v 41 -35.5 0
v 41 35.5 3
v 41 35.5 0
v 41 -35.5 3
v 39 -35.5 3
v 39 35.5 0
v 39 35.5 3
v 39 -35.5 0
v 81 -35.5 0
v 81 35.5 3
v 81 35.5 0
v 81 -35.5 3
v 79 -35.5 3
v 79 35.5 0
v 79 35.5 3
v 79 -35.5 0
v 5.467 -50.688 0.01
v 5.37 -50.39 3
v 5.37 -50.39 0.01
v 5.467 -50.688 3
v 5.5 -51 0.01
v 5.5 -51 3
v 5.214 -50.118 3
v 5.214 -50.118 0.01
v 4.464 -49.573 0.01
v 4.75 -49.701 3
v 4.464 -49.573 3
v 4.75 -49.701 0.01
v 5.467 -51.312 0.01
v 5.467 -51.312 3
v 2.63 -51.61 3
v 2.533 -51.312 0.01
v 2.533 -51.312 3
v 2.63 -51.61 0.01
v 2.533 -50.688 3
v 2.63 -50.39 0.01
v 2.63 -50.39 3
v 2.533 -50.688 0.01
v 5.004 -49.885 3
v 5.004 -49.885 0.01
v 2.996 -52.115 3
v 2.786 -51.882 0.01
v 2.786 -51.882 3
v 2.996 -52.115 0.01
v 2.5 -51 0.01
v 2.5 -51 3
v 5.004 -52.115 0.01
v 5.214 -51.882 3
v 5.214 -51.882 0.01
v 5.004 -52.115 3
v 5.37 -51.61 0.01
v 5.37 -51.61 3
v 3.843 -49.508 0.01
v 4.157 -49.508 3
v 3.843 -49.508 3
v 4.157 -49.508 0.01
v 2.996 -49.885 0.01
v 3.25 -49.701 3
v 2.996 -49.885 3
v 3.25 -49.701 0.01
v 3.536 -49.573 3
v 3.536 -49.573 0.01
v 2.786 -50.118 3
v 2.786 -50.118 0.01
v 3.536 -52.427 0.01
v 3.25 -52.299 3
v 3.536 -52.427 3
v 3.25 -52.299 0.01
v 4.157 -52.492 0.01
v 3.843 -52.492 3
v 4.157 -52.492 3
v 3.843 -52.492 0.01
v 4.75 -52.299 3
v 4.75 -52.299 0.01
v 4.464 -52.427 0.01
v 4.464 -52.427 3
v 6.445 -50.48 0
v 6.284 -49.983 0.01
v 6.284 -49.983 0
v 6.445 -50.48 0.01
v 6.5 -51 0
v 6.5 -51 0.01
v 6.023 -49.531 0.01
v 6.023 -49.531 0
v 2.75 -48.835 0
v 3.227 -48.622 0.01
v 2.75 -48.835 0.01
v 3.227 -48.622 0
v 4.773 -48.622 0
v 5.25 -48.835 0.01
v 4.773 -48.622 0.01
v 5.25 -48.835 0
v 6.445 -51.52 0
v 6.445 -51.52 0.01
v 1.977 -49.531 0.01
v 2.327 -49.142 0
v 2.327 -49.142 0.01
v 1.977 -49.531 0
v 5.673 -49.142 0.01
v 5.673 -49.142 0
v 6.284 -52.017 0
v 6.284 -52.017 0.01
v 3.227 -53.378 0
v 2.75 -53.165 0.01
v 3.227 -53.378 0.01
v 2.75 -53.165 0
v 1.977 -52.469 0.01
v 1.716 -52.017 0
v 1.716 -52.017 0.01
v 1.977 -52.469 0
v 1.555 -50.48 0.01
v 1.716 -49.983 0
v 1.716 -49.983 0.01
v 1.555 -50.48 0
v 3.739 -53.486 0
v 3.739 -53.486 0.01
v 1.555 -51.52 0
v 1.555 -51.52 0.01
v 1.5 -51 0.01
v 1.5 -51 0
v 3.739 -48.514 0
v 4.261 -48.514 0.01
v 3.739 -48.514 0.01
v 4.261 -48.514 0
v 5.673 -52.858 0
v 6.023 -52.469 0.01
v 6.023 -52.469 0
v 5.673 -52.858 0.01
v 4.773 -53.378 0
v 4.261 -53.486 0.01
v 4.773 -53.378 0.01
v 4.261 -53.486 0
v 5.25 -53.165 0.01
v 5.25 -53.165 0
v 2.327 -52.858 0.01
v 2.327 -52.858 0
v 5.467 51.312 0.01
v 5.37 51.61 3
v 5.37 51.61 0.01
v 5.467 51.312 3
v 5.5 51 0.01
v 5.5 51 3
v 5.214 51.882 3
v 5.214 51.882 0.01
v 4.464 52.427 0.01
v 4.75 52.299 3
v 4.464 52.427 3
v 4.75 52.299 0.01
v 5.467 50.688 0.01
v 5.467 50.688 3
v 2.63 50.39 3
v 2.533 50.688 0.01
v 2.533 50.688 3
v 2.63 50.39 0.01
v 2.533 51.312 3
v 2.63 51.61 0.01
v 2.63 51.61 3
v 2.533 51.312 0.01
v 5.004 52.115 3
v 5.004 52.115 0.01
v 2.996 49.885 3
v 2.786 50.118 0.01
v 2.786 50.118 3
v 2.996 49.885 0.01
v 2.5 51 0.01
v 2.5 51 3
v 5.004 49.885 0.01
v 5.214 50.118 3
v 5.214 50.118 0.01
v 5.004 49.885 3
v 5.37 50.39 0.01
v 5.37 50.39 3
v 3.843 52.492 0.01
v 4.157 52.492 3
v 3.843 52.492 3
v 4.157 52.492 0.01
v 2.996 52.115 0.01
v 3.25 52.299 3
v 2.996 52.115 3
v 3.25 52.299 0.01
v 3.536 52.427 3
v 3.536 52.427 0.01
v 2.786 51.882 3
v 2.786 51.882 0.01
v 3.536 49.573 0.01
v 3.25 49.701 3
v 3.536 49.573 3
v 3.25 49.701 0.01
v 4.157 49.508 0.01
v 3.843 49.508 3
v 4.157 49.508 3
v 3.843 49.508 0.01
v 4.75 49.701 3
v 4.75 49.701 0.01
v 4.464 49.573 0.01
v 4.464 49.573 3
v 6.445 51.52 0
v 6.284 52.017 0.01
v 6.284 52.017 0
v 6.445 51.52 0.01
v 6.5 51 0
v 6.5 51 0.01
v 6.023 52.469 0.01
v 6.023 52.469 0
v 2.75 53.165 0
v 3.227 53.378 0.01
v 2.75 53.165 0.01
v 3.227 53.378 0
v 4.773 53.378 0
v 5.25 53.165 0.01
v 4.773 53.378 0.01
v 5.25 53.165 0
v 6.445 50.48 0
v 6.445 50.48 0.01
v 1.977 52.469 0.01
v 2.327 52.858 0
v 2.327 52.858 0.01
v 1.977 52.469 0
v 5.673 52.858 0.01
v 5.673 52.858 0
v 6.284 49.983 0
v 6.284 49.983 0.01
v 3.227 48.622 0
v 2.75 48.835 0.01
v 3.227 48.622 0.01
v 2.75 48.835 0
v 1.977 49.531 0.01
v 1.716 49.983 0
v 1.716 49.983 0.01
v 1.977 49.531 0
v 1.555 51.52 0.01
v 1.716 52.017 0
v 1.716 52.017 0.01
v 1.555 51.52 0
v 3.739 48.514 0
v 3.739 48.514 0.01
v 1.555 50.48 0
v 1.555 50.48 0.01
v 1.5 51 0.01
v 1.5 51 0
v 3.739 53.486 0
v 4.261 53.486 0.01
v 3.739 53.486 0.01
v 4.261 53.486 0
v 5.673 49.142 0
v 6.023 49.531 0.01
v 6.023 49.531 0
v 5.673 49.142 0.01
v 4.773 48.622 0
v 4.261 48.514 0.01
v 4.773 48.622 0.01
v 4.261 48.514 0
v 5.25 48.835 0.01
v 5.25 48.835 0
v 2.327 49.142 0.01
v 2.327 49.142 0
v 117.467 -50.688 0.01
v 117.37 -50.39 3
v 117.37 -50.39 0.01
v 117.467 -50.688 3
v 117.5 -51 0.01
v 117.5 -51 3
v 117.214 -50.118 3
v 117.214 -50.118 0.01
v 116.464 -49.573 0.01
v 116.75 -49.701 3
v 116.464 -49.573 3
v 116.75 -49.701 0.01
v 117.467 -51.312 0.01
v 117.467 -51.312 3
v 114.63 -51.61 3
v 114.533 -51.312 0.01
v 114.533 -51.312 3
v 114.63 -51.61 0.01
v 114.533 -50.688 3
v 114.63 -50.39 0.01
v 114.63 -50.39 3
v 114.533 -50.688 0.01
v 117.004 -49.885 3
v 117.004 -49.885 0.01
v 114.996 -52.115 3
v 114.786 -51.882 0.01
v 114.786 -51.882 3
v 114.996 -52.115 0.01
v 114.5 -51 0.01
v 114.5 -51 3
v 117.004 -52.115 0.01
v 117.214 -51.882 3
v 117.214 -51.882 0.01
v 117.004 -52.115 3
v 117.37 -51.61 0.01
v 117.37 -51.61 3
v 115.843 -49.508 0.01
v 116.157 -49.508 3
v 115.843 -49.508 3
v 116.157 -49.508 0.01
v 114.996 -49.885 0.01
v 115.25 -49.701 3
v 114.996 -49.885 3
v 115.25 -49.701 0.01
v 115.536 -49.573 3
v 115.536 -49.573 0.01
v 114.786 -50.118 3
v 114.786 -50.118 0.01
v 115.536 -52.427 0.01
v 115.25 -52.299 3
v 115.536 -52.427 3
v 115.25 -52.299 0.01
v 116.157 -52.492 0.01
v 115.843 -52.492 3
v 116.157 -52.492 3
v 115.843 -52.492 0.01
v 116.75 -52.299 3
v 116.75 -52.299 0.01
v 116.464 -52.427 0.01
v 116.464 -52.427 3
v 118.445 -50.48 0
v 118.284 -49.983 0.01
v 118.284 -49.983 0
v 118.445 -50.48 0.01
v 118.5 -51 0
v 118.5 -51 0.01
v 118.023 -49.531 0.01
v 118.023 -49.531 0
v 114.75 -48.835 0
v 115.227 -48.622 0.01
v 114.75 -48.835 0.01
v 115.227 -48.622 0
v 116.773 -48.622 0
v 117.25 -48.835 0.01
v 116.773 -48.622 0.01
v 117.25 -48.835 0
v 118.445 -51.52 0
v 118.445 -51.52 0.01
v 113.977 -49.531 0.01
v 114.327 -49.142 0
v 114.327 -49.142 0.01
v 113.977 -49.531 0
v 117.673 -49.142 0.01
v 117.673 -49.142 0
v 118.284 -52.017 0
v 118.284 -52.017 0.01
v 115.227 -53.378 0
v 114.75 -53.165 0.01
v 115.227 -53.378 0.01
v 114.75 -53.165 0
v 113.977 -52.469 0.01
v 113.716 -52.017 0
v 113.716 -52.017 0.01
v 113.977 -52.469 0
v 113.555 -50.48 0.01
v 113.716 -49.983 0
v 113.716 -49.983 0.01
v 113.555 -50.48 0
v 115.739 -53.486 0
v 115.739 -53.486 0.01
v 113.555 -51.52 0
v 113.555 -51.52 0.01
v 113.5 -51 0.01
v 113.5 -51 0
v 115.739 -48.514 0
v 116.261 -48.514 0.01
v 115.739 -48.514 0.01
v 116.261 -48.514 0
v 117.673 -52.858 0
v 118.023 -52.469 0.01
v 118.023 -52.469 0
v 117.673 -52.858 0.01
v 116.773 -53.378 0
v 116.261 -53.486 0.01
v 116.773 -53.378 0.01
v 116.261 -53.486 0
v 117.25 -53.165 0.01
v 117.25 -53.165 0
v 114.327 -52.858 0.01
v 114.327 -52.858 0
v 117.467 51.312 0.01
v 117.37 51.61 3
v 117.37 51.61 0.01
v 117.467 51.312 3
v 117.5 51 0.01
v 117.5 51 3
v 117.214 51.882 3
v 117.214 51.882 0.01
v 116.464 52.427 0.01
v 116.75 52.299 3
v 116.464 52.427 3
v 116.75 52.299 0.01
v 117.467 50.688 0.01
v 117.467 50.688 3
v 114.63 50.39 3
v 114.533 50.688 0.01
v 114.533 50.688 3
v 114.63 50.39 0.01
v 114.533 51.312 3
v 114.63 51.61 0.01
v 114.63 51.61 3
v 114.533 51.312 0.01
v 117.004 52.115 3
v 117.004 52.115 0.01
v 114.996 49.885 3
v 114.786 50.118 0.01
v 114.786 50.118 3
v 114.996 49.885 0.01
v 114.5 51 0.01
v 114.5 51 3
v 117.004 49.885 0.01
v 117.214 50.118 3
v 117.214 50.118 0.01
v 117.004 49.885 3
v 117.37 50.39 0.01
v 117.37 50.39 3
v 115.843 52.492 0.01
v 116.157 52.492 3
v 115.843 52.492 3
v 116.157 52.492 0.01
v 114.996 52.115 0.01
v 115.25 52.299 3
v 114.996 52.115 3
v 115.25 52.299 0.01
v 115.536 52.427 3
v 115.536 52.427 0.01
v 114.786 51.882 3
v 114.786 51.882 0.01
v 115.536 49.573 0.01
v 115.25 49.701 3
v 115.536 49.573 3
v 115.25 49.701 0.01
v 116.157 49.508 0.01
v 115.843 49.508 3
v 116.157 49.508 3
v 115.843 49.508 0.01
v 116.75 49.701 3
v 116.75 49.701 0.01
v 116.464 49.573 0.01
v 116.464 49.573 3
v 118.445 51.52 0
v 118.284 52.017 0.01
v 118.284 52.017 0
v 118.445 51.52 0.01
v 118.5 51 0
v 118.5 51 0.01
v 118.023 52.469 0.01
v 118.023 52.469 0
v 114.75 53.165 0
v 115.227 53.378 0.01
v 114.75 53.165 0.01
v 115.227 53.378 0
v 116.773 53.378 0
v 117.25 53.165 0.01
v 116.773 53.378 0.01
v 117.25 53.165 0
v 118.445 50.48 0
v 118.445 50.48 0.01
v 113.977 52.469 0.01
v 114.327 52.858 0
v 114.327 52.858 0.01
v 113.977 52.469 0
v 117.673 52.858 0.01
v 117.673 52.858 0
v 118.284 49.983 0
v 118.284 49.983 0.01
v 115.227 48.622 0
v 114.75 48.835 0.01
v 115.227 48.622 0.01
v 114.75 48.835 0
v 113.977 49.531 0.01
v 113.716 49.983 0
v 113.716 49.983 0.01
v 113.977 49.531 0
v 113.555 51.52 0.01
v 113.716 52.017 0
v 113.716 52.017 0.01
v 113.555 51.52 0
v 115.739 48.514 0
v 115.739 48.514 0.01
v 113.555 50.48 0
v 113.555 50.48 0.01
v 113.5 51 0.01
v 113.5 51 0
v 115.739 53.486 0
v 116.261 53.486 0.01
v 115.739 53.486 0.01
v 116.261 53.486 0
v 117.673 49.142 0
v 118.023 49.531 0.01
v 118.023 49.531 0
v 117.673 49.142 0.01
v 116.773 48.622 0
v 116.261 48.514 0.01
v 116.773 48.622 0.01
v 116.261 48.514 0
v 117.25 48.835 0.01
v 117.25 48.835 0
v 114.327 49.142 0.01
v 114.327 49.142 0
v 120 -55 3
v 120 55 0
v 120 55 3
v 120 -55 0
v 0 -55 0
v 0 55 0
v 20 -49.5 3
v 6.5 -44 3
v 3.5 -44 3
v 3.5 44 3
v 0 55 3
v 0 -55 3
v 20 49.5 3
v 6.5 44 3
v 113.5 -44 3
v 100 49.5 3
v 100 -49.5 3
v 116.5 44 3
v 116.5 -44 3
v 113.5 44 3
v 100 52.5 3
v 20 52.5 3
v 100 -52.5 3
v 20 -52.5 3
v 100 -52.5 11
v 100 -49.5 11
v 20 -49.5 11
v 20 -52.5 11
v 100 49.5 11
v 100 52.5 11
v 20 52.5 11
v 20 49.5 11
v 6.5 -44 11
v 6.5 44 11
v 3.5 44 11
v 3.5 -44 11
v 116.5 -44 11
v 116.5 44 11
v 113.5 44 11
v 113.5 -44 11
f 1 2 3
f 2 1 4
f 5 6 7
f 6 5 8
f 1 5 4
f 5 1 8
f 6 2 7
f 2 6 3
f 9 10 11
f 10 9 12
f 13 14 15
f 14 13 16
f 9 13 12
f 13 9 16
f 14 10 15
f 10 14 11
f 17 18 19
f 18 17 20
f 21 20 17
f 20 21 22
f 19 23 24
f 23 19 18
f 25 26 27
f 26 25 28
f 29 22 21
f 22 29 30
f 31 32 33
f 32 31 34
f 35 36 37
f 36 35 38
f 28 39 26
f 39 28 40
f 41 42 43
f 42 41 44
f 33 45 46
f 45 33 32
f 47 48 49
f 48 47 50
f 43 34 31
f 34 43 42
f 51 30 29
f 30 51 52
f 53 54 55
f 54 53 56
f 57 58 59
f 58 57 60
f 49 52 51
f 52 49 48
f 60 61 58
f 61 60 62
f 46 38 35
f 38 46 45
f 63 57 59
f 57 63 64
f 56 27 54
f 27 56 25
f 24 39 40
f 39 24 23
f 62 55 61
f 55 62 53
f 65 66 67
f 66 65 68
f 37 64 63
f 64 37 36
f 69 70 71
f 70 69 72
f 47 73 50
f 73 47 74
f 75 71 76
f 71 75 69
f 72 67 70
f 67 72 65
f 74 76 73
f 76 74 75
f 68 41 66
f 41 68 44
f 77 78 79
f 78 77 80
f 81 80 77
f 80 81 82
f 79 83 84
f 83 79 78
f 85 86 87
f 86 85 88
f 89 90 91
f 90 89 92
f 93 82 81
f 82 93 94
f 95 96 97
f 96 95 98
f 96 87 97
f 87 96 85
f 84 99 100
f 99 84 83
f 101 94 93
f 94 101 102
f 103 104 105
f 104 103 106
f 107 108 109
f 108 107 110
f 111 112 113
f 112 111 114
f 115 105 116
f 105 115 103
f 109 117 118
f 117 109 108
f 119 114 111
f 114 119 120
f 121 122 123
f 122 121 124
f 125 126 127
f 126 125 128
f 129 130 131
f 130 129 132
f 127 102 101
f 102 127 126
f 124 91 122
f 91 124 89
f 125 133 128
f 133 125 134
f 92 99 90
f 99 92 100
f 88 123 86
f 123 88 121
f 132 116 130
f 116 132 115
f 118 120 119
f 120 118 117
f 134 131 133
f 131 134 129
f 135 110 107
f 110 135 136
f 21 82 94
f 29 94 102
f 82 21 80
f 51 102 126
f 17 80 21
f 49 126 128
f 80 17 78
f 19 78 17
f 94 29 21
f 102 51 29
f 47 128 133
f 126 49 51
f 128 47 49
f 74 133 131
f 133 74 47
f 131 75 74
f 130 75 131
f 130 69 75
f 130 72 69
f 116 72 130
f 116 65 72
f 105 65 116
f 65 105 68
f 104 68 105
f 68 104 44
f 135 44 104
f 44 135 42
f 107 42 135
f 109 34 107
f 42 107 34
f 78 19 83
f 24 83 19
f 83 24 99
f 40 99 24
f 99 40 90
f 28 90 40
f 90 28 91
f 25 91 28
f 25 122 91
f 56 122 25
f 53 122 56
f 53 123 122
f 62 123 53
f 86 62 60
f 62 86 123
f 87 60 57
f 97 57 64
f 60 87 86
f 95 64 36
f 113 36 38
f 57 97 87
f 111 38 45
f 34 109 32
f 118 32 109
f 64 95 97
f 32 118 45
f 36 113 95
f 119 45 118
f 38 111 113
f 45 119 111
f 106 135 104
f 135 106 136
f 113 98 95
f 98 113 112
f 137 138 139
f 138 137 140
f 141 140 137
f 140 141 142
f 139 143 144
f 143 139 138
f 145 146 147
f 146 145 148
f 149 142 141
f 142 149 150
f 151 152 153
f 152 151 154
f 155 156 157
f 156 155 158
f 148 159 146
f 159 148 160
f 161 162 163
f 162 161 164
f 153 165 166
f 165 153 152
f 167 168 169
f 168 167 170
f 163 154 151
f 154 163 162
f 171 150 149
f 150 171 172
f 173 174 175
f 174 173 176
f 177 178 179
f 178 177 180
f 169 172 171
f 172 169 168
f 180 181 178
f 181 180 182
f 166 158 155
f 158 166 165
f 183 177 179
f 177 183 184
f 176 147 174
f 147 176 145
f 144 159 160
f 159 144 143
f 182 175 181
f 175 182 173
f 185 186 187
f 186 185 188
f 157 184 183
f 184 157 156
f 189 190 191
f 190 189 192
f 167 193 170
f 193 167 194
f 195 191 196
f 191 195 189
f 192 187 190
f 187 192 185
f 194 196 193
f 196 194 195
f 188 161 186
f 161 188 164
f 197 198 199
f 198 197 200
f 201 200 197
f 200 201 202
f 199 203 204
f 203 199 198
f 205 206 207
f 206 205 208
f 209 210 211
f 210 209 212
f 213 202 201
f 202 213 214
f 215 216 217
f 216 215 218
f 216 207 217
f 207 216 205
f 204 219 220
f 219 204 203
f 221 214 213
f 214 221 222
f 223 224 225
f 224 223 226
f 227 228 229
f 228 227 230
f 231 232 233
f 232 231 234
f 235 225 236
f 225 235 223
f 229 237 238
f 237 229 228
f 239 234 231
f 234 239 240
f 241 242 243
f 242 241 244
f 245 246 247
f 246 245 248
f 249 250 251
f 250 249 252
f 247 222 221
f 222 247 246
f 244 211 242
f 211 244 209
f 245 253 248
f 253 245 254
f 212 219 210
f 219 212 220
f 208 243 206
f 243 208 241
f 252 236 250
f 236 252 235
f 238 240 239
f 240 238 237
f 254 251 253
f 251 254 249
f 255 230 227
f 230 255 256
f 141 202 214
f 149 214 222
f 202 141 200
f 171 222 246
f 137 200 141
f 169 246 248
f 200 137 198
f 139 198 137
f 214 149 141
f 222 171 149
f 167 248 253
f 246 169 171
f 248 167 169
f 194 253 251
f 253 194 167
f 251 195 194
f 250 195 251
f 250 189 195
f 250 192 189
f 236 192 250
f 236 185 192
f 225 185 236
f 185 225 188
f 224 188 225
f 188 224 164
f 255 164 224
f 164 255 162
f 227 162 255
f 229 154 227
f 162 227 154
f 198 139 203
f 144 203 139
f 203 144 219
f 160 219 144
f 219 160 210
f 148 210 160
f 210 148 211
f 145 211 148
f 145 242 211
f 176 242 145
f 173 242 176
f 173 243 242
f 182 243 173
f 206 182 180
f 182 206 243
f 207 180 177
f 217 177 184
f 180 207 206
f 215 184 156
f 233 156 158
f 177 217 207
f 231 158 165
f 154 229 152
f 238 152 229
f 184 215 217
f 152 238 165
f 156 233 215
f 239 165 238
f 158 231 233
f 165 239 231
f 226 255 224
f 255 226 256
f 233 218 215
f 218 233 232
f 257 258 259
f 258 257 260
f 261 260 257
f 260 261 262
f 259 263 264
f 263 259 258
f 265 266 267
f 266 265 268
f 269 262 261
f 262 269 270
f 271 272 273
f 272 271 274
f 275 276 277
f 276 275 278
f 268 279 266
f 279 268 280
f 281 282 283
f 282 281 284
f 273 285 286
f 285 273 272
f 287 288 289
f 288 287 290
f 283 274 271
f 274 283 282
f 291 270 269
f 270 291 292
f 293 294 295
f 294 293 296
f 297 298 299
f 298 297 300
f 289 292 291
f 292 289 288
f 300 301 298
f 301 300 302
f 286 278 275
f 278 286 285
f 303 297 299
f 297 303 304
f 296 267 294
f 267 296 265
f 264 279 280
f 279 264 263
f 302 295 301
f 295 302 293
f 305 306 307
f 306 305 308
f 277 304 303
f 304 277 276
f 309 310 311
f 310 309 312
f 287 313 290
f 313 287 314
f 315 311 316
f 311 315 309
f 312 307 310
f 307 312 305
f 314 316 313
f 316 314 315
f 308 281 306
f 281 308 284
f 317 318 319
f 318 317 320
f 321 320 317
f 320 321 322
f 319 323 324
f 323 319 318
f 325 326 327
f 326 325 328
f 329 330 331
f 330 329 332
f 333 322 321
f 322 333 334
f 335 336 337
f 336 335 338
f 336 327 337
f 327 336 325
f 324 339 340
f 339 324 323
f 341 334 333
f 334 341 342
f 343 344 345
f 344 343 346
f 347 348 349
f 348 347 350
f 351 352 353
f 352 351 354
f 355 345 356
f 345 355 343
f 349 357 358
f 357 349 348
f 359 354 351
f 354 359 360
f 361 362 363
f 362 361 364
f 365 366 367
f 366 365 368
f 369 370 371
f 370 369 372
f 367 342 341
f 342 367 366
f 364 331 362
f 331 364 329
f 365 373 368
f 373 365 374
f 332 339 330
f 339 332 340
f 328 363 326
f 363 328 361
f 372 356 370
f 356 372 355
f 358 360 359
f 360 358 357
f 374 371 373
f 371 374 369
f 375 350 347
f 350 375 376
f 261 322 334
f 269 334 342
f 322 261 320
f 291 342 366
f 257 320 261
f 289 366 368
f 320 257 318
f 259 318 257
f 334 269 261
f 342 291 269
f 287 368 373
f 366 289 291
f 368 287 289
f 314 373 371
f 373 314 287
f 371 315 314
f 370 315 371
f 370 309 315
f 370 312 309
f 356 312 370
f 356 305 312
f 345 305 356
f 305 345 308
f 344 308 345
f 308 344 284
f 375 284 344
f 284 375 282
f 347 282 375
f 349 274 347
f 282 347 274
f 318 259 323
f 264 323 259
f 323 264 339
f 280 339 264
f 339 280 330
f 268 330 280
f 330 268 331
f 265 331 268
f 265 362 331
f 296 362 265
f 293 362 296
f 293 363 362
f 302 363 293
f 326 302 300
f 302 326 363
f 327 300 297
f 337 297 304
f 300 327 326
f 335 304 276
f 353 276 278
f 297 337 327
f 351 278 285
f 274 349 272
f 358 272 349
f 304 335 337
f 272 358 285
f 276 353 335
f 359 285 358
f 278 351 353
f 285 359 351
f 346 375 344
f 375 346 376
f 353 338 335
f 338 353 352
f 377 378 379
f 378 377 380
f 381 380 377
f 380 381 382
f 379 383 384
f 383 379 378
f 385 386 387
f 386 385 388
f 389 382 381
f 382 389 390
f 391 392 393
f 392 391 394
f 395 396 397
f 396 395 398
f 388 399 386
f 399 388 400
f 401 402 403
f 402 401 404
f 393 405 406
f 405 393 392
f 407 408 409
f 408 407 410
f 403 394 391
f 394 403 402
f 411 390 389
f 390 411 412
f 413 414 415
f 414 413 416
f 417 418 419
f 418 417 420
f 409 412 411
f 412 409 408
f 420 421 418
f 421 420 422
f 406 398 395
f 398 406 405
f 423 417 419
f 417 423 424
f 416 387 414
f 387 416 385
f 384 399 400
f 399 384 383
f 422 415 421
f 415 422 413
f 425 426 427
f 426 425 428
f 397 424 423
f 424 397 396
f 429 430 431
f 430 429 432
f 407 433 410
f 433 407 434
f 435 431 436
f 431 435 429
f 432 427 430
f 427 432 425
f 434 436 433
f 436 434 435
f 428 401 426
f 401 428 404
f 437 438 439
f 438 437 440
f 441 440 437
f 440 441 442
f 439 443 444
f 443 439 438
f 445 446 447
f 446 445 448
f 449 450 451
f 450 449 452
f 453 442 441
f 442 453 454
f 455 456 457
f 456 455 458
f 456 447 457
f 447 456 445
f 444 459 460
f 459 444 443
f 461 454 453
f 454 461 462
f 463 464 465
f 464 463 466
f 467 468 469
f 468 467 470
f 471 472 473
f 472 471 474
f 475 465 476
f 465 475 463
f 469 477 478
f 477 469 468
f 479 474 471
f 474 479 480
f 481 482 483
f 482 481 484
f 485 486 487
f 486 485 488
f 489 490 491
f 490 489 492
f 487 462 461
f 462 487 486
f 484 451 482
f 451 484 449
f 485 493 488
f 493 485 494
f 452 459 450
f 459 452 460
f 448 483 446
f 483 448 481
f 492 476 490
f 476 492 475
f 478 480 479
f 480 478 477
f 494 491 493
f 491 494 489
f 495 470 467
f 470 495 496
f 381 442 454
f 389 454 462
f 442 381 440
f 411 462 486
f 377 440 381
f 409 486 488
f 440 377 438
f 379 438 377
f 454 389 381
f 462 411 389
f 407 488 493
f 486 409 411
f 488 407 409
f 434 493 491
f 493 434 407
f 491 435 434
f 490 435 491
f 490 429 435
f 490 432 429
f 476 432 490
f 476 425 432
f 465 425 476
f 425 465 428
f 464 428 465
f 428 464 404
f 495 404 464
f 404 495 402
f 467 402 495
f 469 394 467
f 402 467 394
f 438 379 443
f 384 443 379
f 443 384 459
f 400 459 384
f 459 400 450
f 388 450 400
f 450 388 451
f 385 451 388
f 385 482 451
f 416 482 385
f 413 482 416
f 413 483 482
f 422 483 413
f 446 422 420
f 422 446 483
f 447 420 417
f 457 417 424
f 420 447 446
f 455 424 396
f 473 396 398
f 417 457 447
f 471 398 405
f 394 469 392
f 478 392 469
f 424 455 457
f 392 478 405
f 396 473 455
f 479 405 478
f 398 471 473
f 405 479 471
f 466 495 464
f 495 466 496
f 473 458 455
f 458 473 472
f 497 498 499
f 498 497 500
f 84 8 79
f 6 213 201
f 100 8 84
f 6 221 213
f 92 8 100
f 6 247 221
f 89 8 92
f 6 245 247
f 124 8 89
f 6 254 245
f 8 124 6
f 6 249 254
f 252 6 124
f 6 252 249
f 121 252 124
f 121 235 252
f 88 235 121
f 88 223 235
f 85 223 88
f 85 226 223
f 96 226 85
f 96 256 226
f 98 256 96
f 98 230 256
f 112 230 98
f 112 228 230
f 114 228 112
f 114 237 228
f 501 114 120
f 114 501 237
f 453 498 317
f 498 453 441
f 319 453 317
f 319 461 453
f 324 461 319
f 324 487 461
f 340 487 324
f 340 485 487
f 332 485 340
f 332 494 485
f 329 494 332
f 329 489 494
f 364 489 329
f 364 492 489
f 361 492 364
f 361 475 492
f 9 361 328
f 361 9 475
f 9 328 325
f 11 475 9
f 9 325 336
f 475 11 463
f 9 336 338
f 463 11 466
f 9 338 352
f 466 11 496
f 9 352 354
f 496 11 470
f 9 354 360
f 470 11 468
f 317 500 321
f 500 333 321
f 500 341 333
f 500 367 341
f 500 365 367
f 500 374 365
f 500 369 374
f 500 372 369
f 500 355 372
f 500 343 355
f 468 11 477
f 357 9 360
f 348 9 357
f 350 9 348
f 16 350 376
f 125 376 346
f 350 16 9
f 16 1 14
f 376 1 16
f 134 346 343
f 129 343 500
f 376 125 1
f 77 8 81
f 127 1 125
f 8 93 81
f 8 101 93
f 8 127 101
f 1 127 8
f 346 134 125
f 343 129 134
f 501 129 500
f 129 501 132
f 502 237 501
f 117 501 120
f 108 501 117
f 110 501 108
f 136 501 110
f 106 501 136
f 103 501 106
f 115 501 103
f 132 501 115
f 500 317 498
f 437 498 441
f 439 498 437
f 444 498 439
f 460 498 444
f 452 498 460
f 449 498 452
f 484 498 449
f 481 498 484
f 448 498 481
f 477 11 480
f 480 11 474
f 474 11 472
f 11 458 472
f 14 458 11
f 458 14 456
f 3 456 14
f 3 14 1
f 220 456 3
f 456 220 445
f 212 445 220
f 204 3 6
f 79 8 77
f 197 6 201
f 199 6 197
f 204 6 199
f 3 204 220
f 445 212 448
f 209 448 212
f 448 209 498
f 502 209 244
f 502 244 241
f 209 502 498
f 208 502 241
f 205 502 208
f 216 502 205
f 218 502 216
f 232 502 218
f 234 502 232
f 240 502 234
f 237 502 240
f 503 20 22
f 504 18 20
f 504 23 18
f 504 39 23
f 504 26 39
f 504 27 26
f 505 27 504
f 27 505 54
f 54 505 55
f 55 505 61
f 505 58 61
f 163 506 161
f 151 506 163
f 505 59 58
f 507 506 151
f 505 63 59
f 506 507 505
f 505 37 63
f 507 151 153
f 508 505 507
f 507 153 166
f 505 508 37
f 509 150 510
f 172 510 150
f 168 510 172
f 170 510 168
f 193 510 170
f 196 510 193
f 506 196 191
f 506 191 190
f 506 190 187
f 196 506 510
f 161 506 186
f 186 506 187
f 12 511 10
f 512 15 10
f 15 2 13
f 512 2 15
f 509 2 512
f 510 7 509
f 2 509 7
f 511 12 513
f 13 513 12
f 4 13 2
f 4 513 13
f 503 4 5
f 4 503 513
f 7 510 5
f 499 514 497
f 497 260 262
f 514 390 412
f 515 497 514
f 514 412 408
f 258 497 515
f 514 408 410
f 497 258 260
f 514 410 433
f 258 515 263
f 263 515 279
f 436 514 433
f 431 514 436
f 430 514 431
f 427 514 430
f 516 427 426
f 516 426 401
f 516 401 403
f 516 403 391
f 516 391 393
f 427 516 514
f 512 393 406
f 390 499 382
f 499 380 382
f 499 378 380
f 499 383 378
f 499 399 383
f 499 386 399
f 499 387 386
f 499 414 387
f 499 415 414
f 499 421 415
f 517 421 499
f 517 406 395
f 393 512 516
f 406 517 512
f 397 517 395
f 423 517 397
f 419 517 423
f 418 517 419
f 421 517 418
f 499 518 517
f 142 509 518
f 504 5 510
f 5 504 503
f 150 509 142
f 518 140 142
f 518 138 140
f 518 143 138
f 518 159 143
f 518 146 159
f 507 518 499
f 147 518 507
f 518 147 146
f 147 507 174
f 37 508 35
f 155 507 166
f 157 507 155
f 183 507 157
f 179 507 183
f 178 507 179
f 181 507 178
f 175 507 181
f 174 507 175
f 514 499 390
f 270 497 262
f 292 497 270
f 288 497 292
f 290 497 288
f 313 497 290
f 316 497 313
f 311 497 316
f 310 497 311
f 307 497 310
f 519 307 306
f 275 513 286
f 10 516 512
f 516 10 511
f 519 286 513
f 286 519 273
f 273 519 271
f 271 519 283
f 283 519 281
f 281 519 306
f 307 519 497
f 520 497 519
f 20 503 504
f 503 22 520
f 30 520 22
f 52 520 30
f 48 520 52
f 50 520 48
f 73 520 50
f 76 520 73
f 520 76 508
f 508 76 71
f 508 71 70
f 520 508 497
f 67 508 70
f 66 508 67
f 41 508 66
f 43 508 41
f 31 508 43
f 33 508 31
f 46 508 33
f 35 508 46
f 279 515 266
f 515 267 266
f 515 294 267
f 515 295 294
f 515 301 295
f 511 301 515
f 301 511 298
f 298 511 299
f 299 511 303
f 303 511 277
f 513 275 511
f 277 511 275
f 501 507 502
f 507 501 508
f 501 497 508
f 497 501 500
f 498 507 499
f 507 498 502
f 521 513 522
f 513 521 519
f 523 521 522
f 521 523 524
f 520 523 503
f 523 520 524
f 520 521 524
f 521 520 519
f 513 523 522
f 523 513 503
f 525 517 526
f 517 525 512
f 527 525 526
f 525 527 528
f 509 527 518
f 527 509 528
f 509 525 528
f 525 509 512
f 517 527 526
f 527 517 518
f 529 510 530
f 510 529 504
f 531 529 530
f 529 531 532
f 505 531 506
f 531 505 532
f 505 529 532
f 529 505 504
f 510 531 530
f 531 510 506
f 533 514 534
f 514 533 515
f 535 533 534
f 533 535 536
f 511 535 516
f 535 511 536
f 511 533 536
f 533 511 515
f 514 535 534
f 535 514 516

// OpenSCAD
// file: fader-insert-60mm-array.scad
/*
  3d printable insert for a control panel
  An array of 60mm faders may be mounted to the insert.
  The insert can then be mounted into to the face of the control
  panel.

  The idea is, it's easy to cut a large hole in a piece of 1/4 inch
  plywood into which the insert may be fitted, but is is difficult
  (impossible) to cut the tiny holes needed for each individual fader
  in such plywood, and anyway the plywood is too thick.

Define the following variables, then include this file and call

	fader_60mm_array_insert(0, 0, fader_spacing, fader_count);

plate_thickness = 3;
countersink = 0.01;
fader_spacing = 18;
fader_count = 10;
web_thickness = 3;
web_height = 10;
tang_hole_width = 2;
plate_height = 110;
fader_screw_holes = 1;

*/

$fn=30;

module fader_screw_hole(x, y, screw_radius, head_radius, hole_depth, countersink_depth)
{
	offset = countersink_depth * 0.5;
	rotate(v = [1, 0, 0], a = 180) {
		translate(v = [x, y, -offset]) {
			union() {
				cylinder(h = hole_depth + offset, r1 = screw_radius, r2 = screw_radius);
				cylinder(h = countersink_depth + offset, r1 = head_radius, r2 = head_radius);
			}
		}
	}
}

module fader_tang_hole(width, length, depth)
{
	translate(v = [0, 0, -0.4 * depth])
		cube(size = [width, length, depth], center = true);
}

module fader_60mm_holes(x, y)
{
	if (fader_screw_holes > 0)  {
		translate(v = [0, 0, plate_thickness]) {
			fader_screw_hole(x, y + 39.5, 0.5 * 3, 0.5 * 5, plate_thickness + 2, countersink);
			fader_screw_hole(x, y - 39.5, 0.5 * 3, 0.5 * 5, plate_thickness + 2, countersink);
		}
	}
	translate(v = [0, 0, plate_thickness + 1]) {
		translate(v = [x, y, 0])
			fader_tang_hole(tang_hole_width, 71, plate_thickness + 2);
	}
}


module fader_60mm_hole_array(x, y, spacing, count)
{
	for (i = [0 : 1 : count - 1]) {
		fader_60mm_holes(x + i * spacing, y);
	}
}

module fader_60mm_array_insert(x, y, spacing, count)
{
	translate(v = [0, 0, plate_thickness]) 
	rotate(v = [1, 0, 0], a = 180)
	union() {
		difference() {
			translate(v = [x, y - plate_height / 2, 0])
				cube(size = [(count + 1) * spacing, plate_height, plate_thickness]);
			fader_60mm_hole_array(x + spacing, y, spacing, count);
			translate(v = [0, 0, plate_thickness]) {
				fader_screw_hole(4, -plate_height / 2 + 4, 0.5 * 3, 0.5 * 5, plate_thickness + 2, countersink);
				fader_screw_hole(4, plate_height / 2 - 4, 0.5 * 3, 0.5 * 5, plate_thickness + 2, countersink);
				fader_screw_hole((count + 1) * spacing - 4, -plate_height / 2 + 4, 0.5 * 3, 0.5 * 5, plate_thickness + 2, countersink);
				fader_screw_hole((count + 1) * spacing - 4, plate_height / 2 - 4, 0.5 * 3, 0.5 * 5, plate_thickness + 2, countersink);
			}
		}
		translate(v = [0.5 * spacing * (count + 1), plate_height / 2 - 4, -plate_thickness]) 
			cube(size = [spacing * count, web_thickness, web_height], center = true);
		translate(v = [0.5 * spacing * (count + 1), -plate_height / 2 + 4, -plate_thickness]) 
			cube(size = [spacing * count, web_thickness, web_height], center = true);
		translate(v = [5, 0, -plate_thickness]) 
			cube(size = [web_thickness, 0.8 * plate_height, web_height], center = true);
		translate(v = [(count + 1) * spacing - 5, 0, -plate_thickness]) 
			cube(size = [web_thickness, 0.8 * plate_height, web_height], center = true);
	}
}

fader_60mm_array_insert(0, 0, fader_spacing, fader_count);
// main file
/*
  3d printable insert for warp and impulse faders on Navigation control panel
*/

plate_thickness = 3;
countersink = 0.01;
fader_spacing = 40;
fader_count = 2;
web_thickness = 3;
web_height = 10;
tang_hole_width = 2;
plate_height = 110;
fader_screw_holes = 0; /* no fader holes */

include <fader-insert-60mm-array.scad>

fader_60mm_array_insert(0, 0, fader_spacing, fader_count);
